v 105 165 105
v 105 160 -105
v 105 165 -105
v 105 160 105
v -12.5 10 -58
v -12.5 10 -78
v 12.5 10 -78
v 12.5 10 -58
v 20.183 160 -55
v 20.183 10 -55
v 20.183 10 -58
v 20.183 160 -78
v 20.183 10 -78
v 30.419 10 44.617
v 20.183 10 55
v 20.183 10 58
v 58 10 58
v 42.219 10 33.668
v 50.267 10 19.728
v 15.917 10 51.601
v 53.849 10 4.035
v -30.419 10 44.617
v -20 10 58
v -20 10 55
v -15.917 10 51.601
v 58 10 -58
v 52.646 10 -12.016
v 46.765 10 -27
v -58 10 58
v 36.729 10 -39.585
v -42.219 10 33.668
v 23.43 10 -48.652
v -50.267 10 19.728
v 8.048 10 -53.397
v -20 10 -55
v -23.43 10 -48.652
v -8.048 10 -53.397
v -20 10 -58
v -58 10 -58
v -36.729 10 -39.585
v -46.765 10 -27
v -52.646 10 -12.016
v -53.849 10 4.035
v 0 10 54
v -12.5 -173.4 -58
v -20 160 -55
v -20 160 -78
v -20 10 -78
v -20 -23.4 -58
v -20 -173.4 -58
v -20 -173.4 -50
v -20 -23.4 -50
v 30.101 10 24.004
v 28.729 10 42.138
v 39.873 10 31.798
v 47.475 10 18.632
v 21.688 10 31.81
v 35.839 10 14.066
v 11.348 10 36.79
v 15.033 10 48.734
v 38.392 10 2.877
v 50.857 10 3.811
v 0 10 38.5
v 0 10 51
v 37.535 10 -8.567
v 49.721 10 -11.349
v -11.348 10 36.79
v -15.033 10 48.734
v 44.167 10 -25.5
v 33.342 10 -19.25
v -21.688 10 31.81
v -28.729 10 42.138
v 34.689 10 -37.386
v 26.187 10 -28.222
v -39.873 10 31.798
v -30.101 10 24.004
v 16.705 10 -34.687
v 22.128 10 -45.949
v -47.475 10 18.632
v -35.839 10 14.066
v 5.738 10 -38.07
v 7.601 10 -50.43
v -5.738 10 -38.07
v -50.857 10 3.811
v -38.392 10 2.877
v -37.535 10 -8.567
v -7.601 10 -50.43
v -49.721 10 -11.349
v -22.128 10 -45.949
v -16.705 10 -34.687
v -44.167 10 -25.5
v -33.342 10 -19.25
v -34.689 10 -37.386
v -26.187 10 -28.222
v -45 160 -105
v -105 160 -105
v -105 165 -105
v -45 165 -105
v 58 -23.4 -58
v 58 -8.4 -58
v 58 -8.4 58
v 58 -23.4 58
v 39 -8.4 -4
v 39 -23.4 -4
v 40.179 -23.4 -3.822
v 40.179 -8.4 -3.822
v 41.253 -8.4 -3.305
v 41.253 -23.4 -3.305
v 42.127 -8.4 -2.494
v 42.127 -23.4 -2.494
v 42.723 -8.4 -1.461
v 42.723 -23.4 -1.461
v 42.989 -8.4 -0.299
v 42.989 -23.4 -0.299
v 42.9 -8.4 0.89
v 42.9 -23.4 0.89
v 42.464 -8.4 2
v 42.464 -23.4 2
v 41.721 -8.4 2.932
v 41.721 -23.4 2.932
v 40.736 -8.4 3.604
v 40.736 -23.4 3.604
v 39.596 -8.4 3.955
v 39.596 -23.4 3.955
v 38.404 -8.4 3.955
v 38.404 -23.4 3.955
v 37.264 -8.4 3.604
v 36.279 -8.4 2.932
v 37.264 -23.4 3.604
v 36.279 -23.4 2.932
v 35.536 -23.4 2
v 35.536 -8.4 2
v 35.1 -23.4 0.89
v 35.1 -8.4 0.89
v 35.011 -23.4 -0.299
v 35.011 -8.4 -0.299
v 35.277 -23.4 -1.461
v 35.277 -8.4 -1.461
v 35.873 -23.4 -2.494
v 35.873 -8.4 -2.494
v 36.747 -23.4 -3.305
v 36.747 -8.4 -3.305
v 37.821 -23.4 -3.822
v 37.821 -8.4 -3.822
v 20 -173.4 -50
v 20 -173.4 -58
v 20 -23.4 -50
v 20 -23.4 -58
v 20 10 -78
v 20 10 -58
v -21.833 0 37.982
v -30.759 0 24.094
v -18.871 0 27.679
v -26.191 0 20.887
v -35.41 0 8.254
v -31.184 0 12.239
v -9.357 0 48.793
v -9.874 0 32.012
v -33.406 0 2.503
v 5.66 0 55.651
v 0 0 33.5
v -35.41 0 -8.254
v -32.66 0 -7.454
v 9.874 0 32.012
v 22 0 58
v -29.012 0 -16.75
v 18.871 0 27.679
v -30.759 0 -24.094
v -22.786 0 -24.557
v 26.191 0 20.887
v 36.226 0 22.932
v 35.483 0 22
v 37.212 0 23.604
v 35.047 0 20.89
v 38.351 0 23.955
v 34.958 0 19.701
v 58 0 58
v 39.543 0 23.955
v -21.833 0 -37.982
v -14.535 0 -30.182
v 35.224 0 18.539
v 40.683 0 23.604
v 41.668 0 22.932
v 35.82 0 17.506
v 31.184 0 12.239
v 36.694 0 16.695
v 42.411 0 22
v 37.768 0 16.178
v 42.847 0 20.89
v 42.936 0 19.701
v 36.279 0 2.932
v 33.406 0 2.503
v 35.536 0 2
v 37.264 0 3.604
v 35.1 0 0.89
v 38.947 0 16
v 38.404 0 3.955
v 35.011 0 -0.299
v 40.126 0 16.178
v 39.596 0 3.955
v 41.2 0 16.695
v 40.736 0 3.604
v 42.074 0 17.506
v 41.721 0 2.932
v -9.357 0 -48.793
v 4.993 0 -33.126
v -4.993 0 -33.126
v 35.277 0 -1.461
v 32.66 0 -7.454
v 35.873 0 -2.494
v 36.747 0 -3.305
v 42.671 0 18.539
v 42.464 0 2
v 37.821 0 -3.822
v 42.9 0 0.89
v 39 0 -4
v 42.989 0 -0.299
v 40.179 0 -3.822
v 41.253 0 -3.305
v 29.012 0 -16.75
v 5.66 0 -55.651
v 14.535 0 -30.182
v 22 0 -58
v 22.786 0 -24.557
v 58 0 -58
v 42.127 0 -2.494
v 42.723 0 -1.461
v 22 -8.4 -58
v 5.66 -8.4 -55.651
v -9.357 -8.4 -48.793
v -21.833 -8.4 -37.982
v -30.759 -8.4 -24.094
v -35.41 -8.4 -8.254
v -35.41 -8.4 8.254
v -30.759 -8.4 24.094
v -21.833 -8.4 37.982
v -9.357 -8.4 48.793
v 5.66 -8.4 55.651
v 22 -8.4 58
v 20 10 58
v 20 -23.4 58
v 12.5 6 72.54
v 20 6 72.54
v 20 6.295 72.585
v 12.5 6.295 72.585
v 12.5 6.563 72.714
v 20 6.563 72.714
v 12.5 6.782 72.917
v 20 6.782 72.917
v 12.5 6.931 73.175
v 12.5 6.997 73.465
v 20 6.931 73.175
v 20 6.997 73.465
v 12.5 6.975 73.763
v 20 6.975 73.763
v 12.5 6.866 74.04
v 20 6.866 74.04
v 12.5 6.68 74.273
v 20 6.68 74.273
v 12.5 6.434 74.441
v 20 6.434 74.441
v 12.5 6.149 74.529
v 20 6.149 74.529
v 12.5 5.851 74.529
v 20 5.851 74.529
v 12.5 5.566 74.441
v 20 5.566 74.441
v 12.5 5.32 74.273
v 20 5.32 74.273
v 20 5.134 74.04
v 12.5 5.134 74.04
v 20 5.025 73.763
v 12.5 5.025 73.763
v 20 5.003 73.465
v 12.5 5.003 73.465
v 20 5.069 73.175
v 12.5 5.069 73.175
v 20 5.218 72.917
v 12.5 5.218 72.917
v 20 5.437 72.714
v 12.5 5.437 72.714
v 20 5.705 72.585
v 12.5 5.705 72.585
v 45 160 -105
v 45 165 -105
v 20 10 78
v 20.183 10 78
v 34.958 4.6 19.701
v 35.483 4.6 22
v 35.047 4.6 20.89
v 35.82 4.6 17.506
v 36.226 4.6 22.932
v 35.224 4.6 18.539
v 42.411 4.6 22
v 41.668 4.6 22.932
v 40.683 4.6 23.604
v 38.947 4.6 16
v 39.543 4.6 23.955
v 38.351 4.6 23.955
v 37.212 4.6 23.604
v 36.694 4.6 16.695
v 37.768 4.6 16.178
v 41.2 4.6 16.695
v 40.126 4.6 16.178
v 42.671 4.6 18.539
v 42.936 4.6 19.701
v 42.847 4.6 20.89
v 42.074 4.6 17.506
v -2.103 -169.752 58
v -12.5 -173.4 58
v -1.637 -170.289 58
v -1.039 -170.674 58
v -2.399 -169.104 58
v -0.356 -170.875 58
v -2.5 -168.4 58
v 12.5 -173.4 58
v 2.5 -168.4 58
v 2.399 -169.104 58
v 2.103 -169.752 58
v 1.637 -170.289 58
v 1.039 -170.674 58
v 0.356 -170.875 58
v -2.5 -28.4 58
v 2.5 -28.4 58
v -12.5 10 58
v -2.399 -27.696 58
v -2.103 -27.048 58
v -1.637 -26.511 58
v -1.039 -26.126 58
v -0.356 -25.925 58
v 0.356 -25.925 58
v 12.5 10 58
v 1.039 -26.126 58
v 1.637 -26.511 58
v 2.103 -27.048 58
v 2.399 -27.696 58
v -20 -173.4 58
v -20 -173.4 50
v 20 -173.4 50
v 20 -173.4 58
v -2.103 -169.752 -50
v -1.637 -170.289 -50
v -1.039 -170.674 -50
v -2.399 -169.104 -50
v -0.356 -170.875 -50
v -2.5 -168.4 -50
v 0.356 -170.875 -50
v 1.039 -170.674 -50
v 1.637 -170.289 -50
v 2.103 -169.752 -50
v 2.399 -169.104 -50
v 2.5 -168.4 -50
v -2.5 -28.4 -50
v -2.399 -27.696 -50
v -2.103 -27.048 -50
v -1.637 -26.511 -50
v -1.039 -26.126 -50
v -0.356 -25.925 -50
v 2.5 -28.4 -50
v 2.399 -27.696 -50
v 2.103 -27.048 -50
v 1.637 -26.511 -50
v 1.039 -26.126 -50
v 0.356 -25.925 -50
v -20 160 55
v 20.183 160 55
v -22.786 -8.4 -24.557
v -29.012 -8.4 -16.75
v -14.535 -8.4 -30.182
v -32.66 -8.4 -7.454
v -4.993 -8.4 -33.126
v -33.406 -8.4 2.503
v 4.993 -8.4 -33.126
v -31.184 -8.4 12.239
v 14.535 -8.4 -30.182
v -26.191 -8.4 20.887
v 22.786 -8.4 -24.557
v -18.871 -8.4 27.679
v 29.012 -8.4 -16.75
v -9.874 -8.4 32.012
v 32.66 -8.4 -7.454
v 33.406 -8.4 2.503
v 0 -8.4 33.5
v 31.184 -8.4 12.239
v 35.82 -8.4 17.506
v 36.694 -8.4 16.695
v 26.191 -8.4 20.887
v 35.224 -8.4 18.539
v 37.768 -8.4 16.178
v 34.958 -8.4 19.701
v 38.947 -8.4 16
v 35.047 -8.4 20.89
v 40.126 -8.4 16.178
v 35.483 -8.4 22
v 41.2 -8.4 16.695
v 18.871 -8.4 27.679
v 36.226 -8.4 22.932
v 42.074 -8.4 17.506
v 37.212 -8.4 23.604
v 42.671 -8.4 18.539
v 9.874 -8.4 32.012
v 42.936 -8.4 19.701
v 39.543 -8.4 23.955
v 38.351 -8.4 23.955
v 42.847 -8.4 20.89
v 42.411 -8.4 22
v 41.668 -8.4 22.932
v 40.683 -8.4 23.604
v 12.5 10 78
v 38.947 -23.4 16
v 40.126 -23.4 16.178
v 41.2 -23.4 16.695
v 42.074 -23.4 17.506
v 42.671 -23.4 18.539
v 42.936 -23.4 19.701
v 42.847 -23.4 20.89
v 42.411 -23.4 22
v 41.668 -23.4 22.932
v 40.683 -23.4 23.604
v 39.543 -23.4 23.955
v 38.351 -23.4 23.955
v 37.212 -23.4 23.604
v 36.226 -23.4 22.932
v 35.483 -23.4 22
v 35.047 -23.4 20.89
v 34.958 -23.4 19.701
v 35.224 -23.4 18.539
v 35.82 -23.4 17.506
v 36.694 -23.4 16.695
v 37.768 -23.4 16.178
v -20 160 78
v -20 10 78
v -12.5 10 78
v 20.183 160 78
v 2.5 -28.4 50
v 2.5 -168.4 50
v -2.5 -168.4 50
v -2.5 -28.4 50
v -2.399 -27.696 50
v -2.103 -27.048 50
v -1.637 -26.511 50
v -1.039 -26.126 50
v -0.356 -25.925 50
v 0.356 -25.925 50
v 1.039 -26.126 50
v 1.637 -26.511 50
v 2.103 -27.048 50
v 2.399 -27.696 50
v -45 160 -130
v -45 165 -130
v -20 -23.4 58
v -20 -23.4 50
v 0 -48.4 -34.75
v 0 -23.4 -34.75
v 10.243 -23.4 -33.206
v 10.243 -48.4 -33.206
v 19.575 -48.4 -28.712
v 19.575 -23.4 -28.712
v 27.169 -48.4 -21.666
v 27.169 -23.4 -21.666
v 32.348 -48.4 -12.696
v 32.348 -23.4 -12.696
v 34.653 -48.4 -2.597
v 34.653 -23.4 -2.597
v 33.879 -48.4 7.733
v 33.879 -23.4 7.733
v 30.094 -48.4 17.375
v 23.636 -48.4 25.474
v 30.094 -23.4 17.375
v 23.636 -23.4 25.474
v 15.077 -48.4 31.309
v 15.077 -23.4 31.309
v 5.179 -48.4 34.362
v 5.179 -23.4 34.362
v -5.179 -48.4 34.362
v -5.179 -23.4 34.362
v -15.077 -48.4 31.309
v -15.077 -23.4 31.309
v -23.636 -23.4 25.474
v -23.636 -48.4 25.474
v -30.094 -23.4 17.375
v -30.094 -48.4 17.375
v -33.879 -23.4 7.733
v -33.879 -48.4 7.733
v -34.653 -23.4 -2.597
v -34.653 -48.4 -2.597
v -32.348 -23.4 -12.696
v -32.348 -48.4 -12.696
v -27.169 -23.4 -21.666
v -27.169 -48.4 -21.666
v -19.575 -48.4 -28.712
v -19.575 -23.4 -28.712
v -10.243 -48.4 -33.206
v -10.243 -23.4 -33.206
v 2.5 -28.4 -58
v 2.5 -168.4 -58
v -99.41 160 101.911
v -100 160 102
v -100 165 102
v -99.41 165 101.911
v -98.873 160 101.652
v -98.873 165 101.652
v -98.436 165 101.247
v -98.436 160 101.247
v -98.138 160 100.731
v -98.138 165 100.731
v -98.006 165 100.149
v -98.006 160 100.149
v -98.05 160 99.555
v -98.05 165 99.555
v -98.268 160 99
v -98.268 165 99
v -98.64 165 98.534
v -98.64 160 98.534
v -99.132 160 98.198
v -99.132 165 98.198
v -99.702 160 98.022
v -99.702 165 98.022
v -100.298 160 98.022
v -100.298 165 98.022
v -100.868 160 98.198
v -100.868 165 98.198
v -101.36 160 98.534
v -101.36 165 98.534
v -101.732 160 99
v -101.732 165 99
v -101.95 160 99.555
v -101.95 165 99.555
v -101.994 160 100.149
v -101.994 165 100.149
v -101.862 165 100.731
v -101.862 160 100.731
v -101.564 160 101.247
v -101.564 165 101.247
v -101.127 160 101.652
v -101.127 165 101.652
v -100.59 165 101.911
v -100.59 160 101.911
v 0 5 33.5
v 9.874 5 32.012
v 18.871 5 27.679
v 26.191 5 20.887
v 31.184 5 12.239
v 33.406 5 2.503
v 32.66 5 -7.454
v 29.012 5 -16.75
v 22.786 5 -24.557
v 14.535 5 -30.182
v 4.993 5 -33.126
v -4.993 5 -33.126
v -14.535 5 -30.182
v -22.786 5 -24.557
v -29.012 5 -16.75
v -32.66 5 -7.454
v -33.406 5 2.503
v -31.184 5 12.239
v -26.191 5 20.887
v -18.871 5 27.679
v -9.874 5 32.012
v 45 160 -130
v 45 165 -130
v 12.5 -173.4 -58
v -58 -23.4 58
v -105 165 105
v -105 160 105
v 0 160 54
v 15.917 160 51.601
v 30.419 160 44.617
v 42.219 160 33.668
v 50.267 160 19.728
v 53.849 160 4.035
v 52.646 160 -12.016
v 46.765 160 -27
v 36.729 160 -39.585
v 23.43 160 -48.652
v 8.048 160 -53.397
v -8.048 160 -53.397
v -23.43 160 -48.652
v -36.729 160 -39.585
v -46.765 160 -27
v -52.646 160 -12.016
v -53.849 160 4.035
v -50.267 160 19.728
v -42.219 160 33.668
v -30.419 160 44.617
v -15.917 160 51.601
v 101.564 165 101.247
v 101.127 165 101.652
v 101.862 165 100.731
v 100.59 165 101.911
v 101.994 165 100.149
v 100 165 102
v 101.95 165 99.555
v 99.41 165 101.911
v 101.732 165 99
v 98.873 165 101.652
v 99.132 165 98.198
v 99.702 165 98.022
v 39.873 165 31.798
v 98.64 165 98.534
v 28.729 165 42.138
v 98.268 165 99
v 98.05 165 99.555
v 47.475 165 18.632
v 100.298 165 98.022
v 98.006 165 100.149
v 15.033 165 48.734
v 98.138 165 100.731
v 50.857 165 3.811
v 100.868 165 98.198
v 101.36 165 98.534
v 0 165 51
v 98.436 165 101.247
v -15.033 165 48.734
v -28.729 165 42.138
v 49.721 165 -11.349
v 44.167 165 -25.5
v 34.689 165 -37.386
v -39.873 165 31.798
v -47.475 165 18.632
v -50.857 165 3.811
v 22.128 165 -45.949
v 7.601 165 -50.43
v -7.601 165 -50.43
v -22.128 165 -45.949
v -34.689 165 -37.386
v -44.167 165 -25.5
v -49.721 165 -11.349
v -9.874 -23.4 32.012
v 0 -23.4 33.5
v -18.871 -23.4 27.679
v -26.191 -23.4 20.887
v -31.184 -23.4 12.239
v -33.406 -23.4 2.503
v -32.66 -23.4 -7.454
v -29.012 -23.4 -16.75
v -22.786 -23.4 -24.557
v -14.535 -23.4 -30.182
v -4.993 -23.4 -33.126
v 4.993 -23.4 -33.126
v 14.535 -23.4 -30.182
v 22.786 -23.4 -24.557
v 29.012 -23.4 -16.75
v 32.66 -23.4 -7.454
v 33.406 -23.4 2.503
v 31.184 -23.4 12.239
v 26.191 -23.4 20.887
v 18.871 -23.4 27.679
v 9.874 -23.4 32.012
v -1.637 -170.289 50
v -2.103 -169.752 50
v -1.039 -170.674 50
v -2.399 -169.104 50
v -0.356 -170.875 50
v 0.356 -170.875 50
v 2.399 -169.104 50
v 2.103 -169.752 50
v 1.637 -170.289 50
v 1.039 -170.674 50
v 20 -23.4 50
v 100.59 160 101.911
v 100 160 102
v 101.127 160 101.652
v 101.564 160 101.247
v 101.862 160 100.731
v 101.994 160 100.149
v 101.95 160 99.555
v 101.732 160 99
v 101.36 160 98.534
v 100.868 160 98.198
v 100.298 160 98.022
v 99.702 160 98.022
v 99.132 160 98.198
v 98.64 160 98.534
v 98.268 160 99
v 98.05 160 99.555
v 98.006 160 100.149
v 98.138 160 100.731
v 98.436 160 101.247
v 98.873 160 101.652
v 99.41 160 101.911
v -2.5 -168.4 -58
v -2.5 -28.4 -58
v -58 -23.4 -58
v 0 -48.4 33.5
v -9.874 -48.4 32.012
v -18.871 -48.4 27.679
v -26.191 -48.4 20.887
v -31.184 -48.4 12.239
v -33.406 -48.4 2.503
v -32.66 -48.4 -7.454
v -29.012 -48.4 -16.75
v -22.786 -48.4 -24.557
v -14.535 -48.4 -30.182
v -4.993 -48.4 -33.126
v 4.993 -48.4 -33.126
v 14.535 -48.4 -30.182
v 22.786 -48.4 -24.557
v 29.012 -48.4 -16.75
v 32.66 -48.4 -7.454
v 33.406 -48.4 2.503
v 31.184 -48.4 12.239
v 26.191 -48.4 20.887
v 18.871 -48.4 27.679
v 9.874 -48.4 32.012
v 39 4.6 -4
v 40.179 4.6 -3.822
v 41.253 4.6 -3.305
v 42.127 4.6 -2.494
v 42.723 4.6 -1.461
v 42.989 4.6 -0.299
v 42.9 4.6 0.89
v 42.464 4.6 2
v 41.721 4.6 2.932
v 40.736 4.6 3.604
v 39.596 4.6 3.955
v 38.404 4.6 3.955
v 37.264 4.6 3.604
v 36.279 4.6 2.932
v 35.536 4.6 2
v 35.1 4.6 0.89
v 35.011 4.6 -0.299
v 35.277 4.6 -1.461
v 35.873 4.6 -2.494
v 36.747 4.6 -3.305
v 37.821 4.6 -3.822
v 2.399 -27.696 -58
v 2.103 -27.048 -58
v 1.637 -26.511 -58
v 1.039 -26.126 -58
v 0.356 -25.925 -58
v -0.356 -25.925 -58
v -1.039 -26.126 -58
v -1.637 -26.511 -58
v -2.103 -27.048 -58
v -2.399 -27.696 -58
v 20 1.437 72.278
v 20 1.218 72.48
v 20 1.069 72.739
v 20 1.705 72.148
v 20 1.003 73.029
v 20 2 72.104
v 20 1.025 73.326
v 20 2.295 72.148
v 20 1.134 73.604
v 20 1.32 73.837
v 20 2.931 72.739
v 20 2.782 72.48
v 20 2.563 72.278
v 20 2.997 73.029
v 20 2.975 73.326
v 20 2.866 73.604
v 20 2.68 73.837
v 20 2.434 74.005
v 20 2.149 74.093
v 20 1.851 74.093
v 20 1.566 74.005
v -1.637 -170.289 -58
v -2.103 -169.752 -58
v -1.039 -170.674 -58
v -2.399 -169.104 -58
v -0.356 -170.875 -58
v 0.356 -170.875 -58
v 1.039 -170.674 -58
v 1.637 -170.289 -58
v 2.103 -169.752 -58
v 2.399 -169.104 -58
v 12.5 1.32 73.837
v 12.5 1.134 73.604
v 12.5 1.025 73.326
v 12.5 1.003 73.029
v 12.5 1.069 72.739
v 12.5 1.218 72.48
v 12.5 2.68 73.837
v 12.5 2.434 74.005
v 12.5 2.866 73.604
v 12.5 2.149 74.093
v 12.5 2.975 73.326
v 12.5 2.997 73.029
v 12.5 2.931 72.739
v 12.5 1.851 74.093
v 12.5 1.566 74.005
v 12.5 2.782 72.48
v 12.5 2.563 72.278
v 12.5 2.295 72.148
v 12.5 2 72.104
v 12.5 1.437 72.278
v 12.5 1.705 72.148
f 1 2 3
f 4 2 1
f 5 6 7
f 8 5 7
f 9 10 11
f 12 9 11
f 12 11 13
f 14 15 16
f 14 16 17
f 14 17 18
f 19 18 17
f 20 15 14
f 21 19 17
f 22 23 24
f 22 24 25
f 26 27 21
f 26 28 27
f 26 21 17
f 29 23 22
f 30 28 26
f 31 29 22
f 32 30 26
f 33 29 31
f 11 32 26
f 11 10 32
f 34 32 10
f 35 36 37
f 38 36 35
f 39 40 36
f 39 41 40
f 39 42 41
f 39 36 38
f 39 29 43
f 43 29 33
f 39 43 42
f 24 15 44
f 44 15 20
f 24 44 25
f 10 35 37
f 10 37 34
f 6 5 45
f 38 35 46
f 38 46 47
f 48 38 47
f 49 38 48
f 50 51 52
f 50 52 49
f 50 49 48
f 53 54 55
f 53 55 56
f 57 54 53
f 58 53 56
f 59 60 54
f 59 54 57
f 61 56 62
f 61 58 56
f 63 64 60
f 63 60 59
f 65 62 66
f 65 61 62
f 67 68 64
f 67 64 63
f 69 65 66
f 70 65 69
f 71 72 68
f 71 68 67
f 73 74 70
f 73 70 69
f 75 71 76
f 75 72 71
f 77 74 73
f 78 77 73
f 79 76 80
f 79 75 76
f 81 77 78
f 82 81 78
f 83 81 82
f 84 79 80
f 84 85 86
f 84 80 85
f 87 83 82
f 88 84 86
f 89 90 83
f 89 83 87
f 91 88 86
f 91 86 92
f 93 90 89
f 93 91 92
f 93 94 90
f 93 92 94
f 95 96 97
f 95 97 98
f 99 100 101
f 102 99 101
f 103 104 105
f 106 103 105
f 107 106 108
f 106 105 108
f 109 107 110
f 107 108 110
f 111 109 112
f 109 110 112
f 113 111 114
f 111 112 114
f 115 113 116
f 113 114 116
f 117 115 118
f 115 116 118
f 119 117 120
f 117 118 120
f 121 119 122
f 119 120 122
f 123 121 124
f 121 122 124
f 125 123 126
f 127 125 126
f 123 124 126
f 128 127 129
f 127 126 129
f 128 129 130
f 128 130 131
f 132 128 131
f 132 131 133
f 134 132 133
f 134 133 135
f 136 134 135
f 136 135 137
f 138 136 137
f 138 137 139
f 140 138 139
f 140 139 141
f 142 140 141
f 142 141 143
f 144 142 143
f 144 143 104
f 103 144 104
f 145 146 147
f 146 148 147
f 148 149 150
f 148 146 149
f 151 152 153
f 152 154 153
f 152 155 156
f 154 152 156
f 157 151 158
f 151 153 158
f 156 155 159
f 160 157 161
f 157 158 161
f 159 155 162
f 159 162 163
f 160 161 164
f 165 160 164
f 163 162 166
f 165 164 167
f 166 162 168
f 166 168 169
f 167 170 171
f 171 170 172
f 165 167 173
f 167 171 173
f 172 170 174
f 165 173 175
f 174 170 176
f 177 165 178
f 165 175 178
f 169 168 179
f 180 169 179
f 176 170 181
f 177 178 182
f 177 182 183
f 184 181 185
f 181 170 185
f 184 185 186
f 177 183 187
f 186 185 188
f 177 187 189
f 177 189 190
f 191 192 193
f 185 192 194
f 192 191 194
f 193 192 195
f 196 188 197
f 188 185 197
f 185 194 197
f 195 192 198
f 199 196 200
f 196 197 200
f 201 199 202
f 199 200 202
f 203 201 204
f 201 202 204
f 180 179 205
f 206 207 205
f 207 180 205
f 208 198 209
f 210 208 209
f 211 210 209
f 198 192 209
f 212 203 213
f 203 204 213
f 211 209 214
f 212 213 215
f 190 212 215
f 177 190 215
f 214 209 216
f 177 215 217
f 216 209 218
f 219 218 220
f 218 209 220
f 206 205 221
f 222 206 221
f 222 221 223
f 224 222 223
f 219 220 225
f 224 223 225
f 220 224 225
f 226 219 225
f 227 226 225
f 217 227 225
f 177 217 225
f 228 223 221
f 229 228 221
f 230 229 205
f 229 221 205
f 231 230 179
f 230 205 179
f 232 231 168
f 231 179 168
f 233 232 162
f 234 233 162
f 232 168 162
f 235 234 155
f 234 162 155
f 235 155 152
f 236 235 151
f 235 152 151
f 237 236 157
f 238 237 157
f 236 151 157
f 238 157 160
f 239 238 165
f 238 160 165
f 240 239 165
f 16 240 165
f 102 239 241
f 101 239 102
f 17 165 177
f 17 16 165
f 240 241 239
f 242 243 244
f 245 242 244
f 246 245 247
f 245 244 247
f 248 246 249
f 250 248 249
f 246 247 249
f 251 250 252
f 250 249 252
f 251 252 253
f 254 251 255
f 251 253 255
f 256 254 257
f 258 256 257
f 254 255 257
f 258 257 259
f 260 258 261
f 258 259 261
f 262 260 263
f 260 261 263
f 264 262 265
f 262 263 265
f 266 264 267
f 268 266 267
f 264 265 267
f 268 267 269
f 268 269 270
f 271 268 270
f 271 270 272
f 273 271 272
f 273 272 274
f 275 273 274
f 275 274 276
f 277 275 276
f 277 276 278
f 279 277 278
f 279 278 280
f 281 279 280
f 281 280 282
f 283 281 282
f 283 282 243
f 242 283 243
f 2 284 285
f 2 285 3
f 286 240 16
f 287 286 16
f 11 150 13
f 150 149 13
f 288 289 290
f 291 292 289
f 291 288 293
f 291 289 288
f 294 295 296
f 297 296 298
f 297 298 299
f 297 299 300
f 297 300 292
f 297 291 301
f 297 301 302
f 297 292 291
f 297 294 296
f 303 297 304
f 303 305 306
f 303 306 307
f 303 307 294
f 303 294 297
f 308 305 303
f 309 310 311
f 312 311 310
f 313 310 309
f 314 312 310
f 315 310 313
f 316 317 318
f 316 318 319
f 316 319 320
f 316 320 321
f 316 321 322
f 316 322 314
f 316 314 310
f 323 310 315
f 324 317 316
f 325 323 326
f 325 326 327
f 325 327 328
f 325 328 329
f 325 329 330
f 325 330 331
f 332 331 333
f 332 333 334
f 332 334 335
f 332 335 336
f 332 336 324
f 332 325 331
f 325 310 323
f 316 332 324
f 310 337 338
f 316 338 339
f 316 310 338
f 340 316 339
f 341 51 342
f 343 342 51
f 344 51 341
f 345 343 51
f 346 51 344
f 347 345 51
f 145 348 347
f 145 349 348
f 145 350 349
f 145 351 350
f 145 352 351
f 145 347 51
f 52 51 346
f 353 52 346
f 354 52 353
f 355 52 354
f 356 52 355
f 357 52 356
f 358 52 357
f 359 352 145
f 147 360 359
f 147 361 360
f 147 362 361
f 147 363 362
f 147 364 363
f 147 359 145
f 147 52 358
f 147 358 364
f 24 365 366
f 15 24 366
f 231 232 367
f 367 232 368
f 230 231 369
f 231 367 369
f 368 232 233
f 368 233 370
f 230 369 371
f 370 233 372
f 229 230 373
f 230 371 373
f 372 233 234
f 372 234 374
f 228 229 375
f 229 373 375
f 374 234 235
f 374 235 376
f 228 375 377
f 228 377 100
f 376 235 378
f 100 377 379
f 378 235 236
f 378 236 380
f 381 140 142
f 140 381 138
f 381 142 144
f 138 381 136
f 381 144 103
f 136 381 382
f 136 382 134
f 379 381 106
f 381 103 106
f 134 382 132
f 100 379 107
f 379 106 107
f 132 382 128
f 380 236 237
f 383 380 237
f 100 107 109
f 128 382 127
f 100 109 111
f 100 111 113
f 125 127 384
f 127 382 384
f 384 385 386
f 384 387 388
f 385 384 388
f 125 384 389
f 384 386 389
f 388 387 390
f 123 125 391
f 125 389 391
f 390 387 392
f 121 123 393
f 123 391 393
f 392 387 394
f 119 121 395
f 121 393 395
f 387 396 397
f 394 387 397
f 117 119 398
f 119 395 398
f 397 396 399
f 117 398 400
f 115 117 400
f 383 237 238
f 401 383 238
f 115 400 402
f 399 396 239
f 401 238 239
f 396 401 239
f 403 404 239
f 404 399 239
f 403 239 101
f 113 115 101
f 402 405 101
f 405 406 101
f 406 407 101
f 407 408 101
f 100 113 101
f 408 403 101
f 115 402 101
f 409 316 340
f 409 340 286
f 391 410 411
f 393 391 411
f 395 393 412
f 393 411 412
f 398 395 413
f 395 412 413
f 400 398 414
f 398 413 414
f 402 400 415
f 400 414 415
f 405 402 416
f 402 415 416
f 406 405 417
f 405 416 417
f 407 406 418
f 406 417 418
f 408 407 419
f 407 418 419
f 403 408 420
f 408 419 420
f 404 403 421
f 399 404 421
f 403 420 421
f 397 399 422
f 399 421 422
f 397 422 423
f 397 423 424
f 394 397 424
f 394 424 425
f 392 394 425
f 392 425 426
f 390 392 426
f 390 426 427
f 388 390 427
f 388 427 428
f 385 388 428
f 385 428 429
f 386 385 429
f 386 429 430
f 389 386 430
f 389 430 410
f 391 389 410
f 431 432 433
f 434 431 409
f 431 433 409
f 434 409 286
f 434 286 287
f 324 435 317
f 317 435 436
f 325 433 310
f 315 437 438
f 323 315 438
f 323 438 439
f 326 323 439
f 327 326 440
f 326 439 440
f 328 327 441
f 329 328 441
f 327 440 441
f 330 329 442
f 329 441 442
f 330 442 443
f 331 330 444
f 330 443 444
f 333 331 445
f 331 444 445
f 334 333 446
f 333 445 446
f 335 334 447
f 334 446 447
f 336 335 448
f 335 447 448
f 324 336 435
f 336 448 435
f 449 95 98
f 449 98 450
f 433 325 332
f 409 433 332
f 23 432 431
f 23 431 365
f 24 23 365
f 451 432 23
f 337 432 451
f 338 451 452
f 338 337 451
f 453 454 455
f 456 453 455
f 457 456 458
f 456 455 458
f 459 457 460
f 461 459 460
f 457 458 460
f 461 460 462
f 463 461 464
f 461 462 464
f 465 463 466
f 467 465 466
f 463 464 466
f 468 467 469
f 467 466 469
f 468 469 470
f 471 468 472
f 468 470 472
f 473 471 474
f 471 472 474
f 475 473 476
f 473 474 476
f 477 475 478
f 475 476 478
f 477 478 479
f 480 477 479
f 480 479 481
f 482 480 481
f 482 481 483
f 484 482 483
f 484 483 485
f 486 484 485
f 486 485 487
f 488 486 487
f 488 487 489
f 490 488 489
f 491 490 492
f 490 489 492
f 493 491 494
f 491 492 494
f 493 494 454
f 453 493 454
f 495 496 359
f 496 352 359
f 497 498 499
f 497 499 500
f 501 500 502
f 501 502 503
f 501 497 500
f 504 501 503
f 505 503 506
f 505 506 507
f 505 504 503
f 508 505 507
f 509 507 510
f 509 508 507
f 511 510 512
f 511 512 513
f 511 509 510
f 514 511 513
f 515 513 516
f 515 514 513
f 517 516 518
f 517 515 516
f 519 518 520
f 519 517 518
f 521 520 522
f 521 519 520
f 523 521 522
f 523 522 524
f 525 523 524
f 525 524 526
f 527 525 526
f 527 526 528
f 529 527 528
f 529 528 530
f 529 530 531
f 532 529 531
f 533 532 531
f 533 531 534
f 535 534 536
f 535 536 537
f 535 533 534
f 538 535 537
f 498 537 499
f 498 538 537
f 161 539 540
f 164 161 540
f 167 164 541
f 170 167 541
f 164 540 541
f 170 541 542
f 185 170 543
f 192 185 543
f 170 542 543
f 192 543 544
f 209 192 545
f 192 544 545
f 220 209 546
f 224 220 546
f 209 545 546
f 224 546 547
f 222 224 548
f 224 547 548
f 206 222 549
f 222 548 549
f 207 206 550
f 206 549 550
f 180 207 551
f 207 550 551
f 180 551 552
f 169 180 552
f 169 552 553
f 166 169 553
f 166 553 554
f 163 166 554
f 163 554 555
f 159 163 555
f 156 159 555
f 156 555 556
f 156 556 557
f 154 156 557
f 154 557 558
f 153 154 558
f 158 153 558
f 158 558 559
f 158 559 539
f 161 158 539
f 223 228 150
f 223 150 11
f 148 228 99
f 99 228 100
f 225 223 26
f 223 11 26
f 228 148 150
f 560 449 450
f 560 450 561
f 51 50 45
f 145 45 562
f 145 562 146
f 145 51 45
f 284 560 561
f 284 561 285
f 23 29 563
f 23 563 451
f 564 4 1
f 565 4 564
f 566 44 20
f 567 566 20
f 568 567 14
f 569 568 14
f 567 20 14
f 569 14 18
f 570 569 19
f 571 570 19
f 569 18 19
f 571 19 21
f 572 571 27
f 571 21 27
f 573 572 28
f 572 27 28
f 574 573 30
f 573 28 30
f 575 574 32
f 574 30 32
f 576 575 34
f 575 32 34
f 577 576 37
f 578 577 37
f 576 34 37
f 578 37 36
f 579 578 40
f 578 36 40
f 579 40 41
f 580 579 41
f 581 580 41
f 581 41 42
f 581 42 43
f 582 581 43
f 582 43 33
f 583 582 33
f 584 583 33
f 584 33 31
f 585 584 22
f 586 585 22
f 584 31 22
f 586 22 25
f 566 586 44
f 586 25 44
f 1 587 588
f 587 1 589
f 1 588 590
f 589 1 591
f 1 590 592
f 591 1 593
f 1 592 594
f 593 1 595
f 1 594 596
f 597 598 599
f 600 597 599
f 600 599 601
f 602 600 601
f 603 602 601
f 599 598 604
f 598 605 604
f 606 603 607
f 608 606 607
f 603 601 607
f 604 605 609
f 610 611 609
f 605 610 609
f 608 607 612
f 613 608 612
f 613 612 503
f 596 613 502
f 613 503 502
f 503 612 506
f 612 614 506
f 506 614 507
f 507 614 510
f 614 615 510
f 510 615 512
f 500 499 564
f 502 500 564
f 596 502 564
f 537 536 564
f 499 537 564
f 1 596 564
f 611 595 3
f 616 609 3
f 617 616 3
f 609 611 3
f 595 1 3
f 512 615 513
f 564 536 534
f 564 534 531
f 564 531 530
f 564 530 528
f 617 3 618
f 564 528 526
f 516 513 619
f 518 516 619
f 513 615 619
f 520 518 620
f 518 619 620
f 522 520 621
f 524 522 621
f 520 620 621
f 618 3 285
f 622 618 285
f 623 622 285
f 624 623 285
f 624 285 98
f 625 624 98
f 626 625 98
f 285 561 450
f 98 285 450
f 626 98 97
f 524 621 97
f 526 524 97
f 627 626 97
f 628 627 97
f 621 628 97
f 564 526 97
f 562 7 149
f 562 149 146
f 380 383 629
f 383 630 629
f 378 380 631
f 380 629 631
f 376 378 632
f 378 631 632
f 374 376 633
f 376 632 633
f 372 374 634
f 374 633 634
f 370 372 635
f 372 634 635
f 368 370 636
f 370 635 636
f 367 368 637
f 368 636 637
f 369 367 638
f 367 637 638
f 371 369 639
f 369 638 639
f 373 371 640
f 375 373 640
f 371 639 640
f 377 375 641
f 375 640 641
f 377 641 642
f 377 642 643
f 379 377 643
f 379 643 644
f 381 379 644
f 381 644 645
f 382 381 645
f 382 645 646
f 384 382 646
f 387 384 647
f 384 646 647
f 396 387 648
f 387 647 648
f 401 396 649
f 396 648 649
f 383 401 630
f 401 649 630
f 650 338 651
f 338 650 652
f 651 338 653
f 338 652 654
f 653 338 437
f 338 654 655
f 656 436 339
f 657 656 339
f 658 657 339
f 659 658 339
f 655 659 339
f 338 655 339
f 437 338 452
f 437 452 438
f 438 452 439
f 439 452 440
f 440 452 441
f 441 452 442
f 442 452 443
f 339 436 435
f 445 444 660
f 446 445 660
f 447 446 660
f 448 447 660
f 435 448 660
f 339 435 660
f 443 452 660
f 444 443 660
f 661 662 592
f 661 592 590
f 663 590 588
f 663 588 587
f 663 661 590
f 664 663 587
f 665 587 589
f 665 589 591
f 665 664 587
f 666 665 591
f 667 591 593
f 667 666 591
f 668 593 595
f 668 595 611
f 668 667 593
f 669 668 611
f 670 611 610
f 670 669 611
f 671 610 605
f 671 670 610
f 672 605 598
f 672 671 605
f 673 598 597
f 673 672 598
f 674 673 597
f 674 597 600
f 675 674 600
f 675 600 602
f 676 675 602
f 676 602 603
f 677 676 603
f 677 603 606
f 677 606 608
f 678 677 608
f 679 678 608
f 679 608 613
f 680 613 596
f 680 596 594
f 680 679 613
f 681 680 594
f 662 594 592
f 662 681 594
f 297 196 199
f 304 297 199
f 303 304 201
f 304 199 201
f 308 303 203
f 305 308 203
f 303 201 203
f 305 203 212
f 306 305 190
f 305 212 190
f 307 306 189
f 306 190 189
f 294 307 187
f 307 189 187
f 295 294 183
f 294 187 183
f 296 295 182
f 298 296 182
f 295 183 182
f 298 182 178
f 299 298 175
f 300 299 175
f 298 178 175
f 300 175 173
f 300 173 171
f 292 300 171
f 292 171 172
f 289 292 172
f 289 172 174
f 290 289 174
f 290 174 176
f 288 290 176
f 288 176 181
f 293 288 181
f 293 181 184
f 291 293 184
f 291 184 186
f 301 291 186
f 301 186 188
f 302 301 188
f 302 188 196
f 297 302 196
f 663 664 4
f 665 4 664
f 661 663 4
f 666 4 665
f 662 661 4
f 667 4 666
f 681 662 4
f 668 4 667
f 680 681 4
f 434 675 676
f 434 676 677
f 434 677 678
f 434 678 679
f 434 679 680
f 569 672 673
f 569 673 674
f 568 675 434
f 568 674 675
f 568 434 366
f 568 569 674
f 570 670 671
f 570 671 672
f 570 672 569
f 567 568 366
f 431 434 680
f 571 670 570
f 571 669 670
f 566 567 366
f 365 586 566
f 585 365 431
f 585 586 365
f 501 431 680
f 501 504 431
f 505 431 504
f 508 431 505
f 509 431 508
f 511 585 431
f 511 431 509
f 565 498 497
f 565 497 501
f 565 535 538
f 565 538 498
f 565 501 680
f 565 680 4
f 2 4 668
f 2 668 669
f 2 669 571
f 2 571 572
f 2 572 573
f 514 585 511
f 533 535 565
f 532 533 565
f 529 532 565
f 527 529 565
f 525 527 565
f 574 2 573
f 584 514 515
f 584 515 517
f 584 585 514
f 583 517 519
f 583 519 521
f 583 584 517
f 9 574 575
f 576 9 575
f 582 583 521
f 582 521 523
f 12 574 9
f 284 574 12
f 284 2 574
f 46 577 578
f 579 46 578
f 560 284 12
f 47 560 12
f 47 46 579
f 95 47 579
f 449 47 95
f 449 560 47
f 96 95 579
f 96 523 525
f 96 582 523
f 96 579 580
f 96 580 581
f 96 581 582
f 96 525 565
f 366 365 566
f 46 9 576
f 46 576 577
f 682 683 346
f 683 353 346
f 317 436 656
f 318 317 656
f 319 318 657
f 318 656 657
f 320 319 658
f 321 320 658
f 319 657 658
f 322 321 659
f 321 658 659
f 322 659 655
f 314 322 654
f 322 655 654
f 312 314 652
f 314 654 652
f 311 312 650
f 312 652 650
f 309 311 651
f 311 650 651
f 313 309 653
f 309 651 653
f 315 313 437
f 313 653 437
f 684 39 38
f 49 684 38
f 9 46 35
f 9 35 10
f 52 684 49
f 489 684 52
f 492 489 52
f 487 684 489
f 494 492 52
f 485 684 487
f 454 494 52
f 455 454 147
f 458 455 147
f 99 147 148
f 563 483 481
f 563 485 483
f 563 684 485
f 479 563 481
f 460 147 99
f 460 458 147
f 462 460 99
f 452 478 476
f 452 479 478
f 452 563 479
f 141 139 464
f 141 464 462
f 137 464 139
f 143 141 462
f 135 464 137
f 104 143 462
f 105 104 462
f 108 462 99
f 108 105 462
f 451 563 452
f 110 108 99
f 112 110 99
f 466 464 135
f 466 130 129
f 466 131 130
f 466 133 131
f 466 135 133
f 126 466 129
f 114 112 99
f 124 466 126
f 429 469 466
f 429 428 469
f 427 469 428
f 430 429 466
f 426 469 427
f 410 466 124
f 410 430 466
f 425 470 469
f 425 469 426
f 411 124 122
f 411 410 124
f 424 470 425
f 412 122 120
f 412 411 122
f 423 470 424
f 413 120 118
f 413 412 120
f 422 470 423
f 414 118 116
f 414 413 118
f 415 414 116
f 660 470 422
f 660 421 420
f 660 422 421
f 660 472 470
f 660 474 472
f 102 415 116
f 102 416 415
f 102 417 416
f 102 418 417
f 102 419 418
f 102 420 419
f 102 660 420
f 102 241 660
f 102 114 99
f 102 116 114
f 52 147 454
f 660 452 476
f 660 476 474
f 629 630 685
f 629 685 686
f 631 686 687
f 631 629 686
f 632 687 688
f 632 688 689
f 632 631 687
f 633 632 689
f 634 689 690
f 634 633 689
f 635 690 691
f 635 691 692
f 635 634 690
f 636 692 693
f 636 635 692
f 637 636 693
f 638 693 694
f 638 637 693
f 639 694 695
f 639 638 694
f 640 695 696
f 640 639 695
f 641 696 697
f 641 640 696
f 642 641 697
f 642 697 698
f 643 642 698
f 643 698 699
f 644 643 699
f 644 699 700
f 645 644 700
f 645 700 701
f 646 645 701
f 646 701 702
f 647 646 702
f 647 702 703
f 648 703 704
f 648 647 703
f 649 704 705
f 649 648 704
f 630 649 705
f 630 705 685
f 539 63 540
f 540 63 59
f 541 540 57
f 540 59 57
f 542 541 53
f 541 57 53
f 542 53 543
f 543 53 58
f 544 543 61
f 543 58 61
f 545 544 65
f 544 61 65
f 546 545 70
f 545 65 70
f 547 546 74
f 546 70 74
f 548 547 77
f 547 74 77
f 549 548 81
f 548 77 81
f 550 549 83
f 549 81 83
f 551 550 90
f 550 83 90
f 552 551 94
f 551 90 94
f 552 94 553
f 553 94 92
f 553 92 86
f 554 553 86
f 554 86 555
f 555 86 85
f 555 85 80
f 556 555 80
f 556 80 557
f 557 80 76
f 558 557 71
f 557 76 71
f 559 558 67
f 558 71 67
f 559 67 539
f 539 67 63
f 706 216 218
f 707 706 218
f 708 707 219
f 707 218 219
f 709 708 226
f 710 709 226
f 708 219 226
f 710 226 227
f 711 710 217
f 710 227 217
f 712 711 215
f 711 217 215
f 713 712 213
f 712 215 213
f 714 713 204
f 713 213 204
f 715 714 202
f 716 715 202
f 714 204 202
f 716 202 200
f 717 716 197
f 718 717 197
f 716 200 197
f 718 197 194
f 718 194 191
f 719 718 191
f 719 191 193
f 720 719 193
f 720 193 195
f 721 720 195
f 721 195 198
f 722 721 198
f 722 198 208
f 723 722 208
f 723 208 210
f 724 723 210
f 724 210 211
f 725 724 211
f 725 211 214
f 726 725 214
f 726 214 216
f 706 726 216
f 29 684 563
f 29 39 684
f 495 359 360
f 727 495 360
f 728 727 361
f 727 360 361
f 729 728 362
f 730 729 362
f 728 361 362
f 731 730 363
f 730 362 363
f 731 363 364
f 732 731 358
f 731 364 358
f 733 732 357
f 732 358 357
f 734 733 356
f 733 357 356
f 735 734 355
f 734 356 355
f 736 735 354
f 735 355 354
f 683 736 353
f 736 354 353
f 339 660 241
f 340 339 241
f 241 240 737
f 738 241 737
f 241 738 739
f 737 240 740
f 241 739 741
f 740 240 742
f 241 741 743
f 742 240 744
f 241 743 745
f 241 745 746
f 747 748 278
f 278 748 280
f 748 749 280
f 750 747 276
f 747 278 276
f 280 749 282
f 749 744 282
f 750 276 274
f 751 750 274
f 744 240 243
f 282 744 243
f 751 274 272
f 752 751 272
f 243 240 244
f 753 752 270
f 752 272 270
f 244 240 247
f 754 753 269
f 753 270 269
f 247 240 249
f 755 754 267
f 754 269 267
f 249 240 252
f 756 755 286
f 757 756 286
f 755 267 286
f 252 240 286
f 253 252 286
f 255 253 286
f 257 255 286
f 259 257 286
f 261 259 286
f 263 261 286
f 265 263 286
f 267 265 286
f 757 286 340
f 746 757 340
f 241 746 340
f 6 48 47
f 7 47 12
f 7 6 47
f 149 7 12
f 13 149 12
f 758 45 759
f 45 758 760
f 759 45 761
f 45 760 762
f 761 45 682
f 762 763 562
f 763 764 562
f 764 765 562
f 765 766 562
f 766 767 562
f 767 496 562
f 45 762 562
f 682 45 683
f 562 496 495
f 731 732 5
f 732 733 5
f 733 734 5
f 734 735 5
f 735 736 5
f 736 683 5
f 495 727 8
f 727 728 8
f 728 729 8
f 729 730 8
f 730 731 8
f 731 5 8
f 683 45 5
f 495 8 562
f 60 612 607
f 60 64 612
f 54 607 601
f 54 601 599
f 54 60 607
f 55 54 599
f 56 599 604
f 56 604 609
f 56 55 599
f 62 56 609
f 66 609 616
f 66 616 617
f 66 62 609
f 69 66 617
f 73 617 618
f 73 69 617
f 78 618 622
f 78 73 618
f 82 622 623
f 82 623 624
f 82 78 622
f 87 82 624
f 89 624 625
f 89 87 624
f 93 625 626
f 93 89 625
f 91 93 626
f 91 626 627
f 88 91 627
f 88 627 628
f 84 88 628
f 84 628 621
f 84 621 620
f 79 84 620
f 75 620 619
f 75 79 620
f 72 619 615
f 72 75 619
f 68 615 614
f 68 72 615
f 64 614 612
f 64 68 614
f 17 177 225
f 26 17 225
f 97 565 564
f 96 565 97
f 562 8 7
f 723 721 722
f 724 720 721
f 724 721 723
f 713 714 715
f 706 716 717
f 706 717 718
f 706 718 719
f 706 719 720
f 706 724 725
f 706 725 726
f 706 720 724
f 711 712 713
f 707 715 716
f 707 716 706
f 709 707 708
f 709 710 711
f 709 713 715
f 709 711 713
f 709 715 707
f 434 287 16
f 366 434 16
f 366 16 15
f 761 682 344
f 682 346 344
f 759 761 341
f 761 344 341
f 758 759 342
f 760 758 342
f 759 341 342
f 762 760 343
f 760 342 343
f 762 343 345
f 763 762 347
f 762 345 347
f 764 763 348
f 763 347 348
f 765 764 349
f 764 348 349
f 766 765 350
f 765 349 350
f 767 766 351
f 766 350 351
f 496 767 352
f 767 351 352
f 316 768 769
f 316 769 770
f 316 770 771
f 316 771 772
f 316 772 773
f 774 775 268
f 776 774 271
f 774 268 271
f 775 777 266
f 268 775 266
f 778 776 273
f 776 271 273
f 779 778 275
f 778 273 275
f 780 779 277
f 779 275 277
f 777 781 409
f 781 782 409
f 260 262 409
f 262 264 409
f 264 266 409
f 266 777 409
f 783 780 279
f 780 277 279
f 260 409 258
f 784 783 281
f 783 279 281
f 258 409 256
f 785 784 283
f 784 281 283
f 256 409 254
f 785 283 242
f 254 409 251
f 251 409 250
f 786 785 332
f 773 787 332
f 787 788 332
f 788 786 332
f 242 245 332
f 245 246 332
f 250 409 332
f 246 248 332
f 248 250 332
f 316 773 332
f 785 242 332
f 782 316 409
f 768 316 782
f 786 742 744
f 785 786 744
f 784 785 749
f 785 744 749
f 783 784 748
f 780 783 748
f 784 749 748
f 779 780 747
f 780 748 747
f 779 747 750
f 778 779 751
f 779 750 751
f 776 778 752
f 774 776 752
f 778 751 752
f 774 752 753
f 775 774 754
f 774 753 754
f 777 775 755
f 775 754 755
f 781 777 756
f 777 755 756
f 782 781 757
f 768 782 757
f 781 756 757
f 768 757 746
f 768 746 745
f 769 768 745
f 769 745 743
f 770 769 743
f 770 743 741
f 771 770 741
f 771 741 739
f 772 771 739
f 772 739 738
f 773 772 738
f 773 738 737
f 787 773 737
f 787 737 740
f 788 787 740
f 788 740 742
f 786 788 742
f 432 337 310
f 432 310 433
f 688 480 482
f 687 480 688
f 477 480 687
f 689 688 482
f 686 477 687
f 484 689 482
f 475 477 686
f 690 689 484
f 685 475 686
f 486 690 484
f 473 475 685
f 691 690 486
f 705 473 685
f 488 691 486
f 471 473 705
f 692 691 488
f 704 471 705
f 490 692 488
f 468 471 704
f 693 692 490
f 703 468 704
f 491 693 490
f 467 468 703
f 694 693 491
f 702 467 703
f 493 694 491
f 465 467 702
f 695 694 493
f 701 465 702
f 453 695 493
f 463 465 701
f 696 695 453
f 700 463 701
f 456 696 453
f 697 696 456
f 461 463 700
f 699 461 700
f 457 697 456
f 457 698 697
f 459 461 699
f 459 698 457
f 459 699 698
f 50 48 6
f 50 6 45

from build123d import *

# Parameters (mm, degrees)
SKETCH4_W                      = 116
SKETCH4_H                      = 116
BOSS_EXTRUDE1_DEPTH            = 10
SKETCH6_R                      = 33.5
CUT_EXTRUDE1_DEPTH             = 83.63171304
BOSS_EXTRUDE3_DEPTH            = 8.4
SKETCH10_W                     = 116
SKETCH10_H                     = 116
BOSS_EXTRUDE5_DEPTH            = 15
SKETCH11_R                     = 4
POSITIONING_HOLE_DEPTH         = 28
SKETCH23_R                     = 4
SNAPPING_HOLE_DEPTH            = 28
SKETCH13_R                     = 34.75
SKETCH13_R_2                   = 33.5
BOSS_EXTRUDE6_DEPTH            = 25
SKETCH24_W                     = 40
SKETCH24_H                     = 8
BOSS_EXTRUDE7_DEPTH            = 150
BOSS_EXTRUDE9_DEPTH            = 40
CUT_EXTRUDE6_DEPTH             = 8
CUT_EXTRUDE6_DIRECTION_2_REACH = 229.876
CUT_EXTRUDE7_REACH             = 225.194
CUT_EXTRUDE9_REACH             = 209.566
SKETCH37_W                     = 25
SKETCH37_H                     = 20
SKETCH12_R                     = 33.5
MAIN_HOLE_DEPTH                = 179.740034687
SKETCH42_R                     = 54
SKETCH42_R_2                   = 51
BOSS_EXTRUDE12_DEPTH           = 150
CHAMFER3_SIZE                  = 5
SKETCH44_W                     = 40.182717611
SKETCH44_H                     = 23
BOSS_EXTRUDE15_DEPTH           = 150
SKETCH41_R                     = 2
BOSS_EXTRUDE11_DEPTH           = 5
CUT_EXTRUDE12_START            = -150
SKETCH45_R                     = 51
CUT_EXTRUDE12_DEPTH            = 150
SKETCH46_R                     = 1
CUT_EXTRUDE13_DEPTH            = 25


with BuildPart() as part:
    # Sketch4 → Boss-Extrude1 (new body)
    with BuildSketch(Plane(origin=(0, 0, 0), x_dir=(1, 0, 0), z_dir=(0, 1, 0))):
        Rectangle(SKETCH4_W, SKETCH4_H)
    extrude(amount=BOSS_EXTRUDE1_DEPTH)

    # Sketch6 → Cut-Extrude1 (cut, through all)
    with BuildSketch(Plane(origin=(0, 10, 0), x_dir=(1, 0, 0), z_dir=(0, 1, 0))):
        with Locations(Location((0, 0, 0), (0, 0, 270))):
            Circle(SKETCH6_R)
    extrude(amount=-CUT_EXTRUDE1_DEPTH, mode=Mode.SUBTRACT)

    # Sketch8 → Boss-Extrude3 (add)
    with BuildSketch(Plane.XZ):
        with BuildLine():
            Line((-58, 58), (-58, -58))
            Line((-58, -58), (22, -58))
            ThreePointArc((22, -58), (-36, 0), (22, 58))
            Line((22, 58), (-58, 58))
        make_face()
    extrude(amount=BOSS_EXTRUDE3_DEPTH)

    # Sketch10 → Boss-Extrude5 (add)
    with BuildSketch(Plane.XZ.offset(8.4)):
        Rectangle(SKETCH10_W, SKETCH10_H)
    extrude(amount=BOSS_EXTRUDE5_DEPTH)

    # Sketch11 → positioning hole (cut)
    with BuildSketch(Plane.XZ.offset(23.4)):
        with Locations(Location((39, 0, 0), (0, 0, 270))):
            Circle(SKETCH11_R)
    extrude(amount=-POSITIONING_HOLE_DEPTH, mode=Mode.SUBTRACT)

    # Sketch23 → snapping hole (cut)
    with BuildSketch(Plane.XZ.offset(23.4)):
        with Locations(Location((38.947036647, 20, 0), (0, 0, 270))):
            Circle(SKETCH23_R)
    extrude(amount=-SNAPPING_HOLE_DEPTH, mode=Mode.SUBTRACT)

    # Sketch13 → Boss-Extrude6 (add)
    with BuildSketch(Plane.XZ.offset(23.4)):
        with Locations(Location((0, 0, 0), (0, 0, 270))):
            Circle(SKETCH13_R)
        with Locations(Location((0, 0, 0), (0, 0, 90))):
            Circle(SKETCH13_R_2, mode=Mode.SUBTRACT)
    extrude(amount=BOSS_EXTRUDE6_DEPTH)

    # Sketch24 → Boss-Extrude7 (add)
    with BuildSketch(Plane.XZ.offset(23.4)):
        with Locations((0, 54)):
            Rectangle(SKETCH24_W, SKETCH24_H)
        with Locations((0, -54)):
            Rectangle(SKETCH24_W, SKETCH24_H)
    extrude(amount=BOSS_EXTRUDE7_DEPTH)

    # Sketch28 → Boss-Extrude9 (add)
    with BuildSketch(Plane.ZY.offset(20)):
        Polygon((-58, -173.4), (-58, 10), (-78, 10), align=None)
        Polygon((58, 10), (58, -173.4), (78, 10), align=None)
    extrude(amount=-BOSS_EXTRUDE9_DEPTH)

    # Sketch31 → Cut-Extrude6 (cut)
    with BuildSketch(Plane(origin=(0, 0, -58), x_dir=(-1, 0, 0), z_dir=(0, 0, -1))):
        with BuildLine():
            Line((2.5, -28.4), (2.5, -168.4))
            ThreePointArc((2.5, -168.4), (0, -170.9), (-2.5, -168.4))
            Line((-2.5, -168.4), (-2.5, -28.4))
            ThreePointArc((-2.5, -28.4), (0, -25.9), (2.5, -28.4))
        make_face()
    extrude(amount=-CUT_EXTRUDE6_DEPTH, mode=Mode.SUBTRACT)

    # Cut-Extrude6 direction 2: up to this plane
    cut_extrude6_direction_2_end = Plane(origin=(20, 10, -78), z_dir=(0, -0.1084085524287415, -0.9941064257715594))
    # Sketch31 → Cut-Extrude6 direction 2 (cut, up to the surface)
    with BuildSketch(Plane(origin=(0, 0, -58), x_dir=(-1, 0, 0), z_dir=(0, 0, -1)), mode=Mode.PRIVATE) as cut_extrude6_direction_2_sk1:
        with BuildLine():
            Line((2.5, -28.4), (2.5, -168.4))
            ThreePointArc((2.5, -168.4), (0, -170.9), (-2.5, -168.4))
            Line((-2.5, -168.4), (-2.5, -28.4))
            ThreePointArc((-2.5, -28.4), (0, -25.9), (2.5, -28.4))
        make_face()
    cut_extrude6_direction_2_tool1 = split(extrude(cut_extrude6_direction_2_sk1.sketch, amount=CUT_EXTRUDE6_DIRECTION_2_REACH, mode=Mode.PRIVATE), bisect_by=cut_extrude6_direction_2_end, keep=Keep.BOTH, mode=Mode.PRIVATE)
    add(cut_extrude6_direction_2_tool1.solids().sort_by_distance((0, -98.4, -58))[0], mode=Mode.SUBTRACT)

    # Cut-Extrude7: up to this plane
    cut_extrude7_end = Plane(origin=(20, -173.4, 58), z_dir=(0, -0.1084085524287415, 0.9941064257715594))
    # Sketch34 → Cut-Extrude7 (cut, up to the surface)
    with BuildSketch(Plane(origin=(0, 0, 50), x_dir=(-1, 0, 0), z_dir=(0, 0, -1)), mode=Mode.PRIVATE) as cut_extrude7_sk1:
        with BuildLine():
            Line((-2.5, -28.4), (-2.5, -168.4))
            ThreePointArc((-2.5, -168.4), (0, -170.9), (2.5, -168.4))
            Line((2.5, -168.4), (2.5, -28.4))
            ThreePointArc((2.5, -28.4), (0, -25.9), (-2.5, -28.4))
        make_face()
    cut_extrude7_tool1 = split(extrude(cut_extrude7_sk1.sketch, amount=-CUT_EXTRUDE7_REACH, mode=Mode.PRIVATE), bisect_by=cut_extrude7_end, keep=Keep.BOTH, mode=Mode.PRIVATE)
    add(cut_extrude7_tool1.solids().sort_by_distance((0, -98.4, 50))[0], mode=Mode.SUBTRACT)

    # Sketch37 → Cut-Extrude9 (cut, up to next)
    with BuildSketch(Plane(origin=(0, 10, 0), x_dir=(1, 0, 0), z_dir=(0, 1, 0)), mode=Mode.PRIVATE) as cut_extrude9_sk1:
        with Locations((0, 68)):
            Rectangle(SKETCH37_W, SKETCH37_H)
    cut_extrude9_tool1 = extrude(cut_extrude9_sk1.sketch, amount=-CUT_EXTRUDE9_REACH, mode=Mode.PRIVATE) & part.part
    # Sketch37 → Cut-Extrude9 (cut, up to next)
    with BuildSketch(Plane(origin=(0, 10, 0), x_dir=(1, 0, 0), z_dir=(0, 1, 0)), mode=Mode.PRIVATE) as cut_extrude9_sk2:
        with Locations((0, -68)):
            Rectangle(SKETCH37_W, SKETCH37_H)
    cut_extrude9_tool2 = extrude(cut_extrude9_sk2.sketch, amount=-CUT_EXTRUDE9_REACH, mode=Mode.PRIVATE) & part.part
    add(cut_extrude9_tool1.solids().sort_by_distance((0, 10, -68))[0], mode=Mode.SUBTRACT)
    add(cut_extrude9_tool2.solids().sort_by_distance((0, 10, 68))[0], mode=Mode.SUBTRACT)

    # Sketch12 → main hole (cut, through all)
    with BuildSketch(Plane.XZ.offset(23.4)):
        with Locations(Location((0, 0, 0), (0, 0, 90))):
            Circle(SKETCH12_R)
    extrude(amount=-MAIN_HOLE_DEPTH, mode=Mode.SUBTRACT)

    # Sketch42 → Boss-Extrude12 (add)
    with BuildSketch(Plane(origin=(0, 10, 0), x_dir=(1, 0, 0), z_dir=(0, 1, 0))):
        with Locations(Location((0, 0, 0), (0, 0, 270))):
            Circle(SKETCH42_R)
        with Locations(Location((0, 0, 0), (0, 0, 270))):
            Circle(SKETCH42_R_2, mode=Mode.SUBTRACT)
    extrude(amount=BOSS_EXTRUDE12_DEPTH)

    # Chamfer3
    chamfer3_edges = [part.edges().sort_by_distance(p)[0] for p in [
        (0, 10, -33.5),
    ]]
    chamfer(chamfer3_edges, length=CHAMFER3_SIZE)

    # Sketch44 → Boss-Extrude15 (add)
    with BuildSketch(Plane(origin=(0, 10, 0), x_dir=(1, 0, 0), z_dir=(0, 1, 0))):
        with Locations((0.091358806, 66.5)):
            Rectangle(SKETCH44_W, SKETCH44_H)
        with Locations((0.091358806, -66.5)):
            Rectangle(SKETCH44_W, SKETCH44_H)
    extrude(amount=BOSS_EXTRUDE15_DEPTH)

    # Sketch41 → Boss-Extrude11 (add)
    with BuildSketch(Plane(origin=(0, 160, 0), x_dir=(1, 0, 0), z_dir=(0, 1, 0))):
        Polygon((45, 105), (105, 105), (105, -105), (-105, -105), (-105, 105), (-45, 105), (-45, 130), (45, 130), align=None)
        with Locations(Location((-100, -100, 0), (0, 0, 270))):
            Circle(SKETCH41_R, mode=Mode.SUBTRACT)
        with Locations(Location((100, -100, 0), (0, 0, 270))):
            Circle(SKETCH41_R, mode=Mode.SUBTRACT)
    extrude(amount=BOSS_EXTRUDE11_DEPTH)

    # Sketch45 → Cut-Extrude12 (cut)
    with BuildSketch(Plane(origin=(0, 165, 0), x_dir=(1, 0, 0), z_dir=(0, 1, 0)).offset(CUT_EXTRUDE12_START)):
        with Locations(Location((0, 0, 0), (0, 0, 270))):
            Circle(SKETCH45_R)
    extrude(amount=CUT_EXTRUDE12_DEPTH, mode=Mode.SUBTRACT)

    # Sketch46 → Cut-Extrude13 (cut)
    with BuildSketch(Plane(origin=(20, 0, 0), x_dir=(0, 0, -1), z_dir=(1, 0, 0))):
        with Locations((-73.540080926, 6)):
            Circle(SKETCH46_R)
        with Locations((-73.10387591, 2)):
            Circle(SKETCH46_R)
    extrude(amount=-CUT_EXTRUDE13_DEPTH, mode=Mode.SUBTRACT)


solid = part.part
